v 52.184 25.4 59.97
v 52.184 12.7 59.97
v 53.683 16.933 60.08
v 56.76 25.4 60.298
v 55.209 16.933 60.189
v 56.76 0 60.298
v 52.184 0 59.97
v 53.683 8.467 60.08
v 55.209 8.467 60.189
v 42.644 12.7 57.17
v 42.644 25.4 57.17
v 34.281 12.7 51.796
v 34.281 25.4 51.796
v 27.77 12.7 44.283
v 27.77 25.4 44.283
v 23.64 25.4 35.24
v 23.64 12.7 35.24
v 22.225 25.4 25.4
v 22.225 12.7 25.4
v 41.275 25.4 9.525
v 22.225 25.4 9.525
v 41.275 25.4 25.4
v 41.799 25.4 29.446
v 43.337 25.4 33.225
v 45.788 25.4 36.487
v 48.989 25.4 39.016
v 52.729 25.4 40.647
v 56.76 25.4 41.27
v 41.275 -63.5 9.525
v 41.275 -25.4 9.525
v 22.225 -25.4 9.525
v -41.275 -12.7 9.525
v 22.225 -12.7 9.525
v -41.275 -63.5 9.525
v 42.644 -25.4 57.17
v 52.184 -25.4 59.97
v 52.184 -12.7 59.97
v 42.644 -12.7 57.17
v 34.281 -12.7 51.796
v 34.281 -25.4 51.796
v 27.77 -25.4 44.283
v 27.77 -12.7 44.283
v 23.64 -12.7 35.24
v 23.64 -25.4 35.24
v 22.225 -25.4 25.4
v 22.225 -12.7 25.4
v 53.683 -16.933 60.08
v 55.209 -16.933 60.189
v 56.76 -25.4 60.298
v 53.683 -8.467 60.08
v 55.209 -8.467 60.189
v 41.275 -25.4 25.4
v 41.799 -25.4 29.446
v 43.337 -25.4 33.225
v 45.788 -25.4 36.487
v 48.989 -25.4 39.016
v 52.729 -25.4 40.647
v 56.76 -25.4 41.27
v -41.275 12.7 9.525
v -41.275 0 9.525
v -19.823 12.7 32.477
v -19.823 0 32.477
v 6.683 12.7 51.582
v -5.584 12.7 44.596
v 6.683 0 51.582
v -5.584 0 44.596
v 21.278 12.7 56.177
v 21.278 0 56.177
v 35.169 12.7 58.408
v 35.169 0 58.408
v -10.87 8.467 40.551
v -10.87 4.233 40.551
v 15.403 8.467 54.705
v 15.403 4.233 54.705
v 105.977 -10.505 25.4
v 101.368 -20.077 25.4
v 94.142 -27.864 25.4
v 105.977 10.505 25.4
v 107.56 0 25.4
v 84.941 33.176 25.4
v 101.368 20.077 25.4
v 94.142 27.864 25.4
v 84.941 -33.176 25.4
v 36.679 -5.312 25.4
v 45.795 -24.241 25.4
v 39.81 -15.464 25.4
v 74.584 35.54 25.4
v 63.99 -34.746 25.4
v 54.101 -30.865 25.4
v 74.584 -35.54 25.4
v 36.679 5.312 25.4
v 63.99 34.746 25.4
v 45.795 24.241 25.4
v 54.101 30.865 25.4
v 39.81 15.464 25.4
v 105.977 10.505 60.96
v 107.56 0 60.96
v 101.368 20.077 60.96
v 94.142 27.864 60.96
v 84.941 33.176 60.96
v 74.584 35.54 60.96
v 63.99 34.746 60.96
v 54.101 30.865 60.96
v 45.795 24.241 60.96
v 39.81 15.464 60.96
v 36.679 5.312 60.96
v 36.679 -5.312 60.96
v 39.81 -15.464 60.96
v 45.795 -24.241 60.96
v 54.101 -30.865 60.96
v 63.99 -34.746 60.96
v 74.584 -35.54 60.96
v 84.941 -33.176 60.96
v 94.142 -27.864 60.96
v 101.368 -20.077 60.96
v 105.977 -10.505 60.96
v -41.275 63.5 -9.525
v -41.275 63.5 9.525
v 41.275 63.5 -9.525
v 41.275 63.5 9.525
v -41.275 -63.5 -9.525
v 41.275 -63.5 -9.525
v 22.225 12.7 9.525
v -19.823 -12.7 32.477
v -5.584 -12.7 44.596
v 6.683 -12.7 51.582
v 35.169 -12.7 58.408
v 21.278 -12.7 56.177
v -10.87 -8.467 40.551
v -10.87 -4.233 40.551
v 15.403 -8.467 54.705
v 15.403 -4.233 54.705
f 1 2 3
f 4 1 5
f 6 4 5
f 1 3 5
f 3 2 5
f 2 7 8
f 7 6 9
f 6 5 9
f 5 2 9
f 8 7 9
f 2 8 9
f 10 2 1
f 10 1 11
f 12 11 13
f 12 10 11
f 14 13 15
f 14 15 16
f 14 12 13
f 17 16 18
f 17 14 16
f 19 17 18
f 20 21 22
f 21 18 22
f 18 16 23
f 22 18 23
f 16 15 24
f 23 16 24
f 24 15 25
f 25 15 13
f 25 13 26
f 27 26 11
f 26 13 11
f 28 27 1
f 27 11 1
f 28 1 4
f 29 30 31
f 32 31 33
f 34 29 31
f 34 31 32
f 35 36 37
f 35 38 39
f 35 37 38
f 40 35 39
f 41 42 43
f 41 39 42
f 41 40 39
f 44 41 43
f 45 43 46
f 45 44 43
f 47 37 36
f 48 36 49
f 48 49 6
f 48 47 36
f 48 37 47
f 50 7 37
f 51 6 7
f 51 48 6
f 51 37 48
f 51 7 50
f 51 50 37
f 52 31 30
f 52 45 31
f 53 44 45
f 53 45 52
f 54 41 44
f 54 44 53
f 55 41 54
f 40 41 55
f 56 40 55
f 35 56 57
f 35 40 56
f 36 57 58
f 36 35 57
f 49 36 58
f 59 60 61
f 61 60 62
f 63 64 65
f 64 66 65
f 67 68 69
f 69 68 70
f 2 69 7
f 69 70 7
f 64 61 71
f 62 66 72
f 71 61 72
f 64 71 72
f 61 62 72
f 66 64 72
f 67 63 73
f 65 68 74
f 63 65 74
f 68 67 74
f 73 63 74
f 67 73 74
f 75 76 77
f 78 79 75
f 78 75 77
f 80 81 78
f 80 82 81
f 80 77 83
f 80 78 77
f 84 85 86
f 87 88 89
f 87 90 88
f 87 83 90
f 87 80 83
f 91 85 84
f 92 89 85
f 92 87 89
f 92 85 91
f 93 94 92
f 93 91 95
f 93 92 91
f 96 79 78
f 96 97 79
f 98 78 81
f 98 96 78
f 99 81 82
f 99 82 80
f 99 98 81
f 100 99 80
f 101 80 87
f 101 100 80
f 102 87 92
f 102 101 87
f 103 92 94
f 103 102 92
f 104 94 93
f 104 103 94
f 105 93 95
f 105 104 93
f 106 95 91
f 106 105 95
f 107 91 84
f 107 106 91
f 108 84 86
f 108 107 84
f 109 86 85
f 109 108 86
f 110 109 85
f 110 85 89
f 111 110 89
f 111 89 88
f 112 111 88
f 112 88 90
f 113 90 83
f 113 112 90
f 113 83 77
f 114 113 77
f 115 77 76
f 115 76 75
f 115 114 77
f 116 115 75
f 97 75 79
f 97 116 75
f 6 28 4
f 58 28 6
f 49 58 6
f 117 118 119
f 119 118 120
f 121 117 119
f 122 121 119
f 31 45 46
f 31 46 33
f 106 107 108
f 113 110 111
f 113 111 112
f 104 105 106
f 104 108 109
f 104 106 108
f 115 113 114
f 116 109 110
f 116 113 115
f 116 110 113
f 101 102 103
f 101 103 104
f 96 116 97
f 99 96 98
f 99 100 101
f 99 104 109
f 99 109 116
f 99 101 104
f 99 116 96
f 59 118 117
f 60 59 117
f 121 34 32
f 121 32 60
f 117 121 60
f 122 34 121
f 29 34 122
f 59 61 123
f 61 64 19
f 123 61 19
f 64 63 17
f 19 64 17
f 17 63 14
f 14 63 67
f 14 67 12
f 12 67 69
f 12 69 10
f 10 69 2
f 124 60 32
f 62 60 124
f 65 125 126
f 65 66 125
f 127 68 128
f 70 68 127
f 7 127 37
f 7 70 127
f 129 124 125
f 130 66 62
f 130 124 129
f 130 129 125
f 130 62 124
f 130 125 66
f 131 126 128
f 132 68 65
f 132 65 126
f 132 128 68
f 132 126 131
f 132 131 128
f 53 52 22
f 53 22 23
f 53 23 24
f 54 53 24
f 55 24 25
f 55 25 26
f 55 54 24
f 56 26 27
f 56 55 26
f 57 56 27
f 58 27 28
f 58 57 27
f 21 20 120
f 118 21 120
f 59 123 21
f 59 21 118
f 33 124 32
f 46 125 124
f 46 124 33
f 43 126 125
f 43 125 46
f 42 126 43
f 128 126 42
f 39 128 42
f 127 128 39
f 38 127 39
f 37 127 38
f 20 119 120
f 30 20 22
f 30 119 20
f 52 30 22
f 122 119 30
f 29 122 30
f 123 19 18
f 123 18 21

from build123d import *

# Parameters (mm, degrees)
F1_DEPTH = 63.5
F2_DEPTH = 25.4
F3_DEPTH = 12.7


with BuildPart() as f1:
    # F0 (on Front) → F1 (new body, symmetric)
    with BuildSketch(Plane.XZ):
        Polygon((41.275, -9.525), (41.275, 9.525), (22.225, 9.525), (-41.275, 9.525), (-41.275, -9.525), align=None)
    extrude(amount=F1_DEPTH, both=True)

    # F0 (on Front) → F2 (join, symmetric)
    with BuildSketch(Plane.XZ):
        with BuildLine():
            Line((22.225, 9.525), (41.275, 9.525))
            Line((41.275, 9.525), (41.275, 25.4))
            ThreePointArc((41.275, 25.4), (45.787793, 36.486744), (56.760465, 41.27022))
            Line((56.760465, 41.27022), (56.760465, 60.298004))
            add(Edge.make_bspline(
                [(52.183549, 59.970074), (53.670589, 60.080373), (55.195529, 60.189302), (56.760465, 60.298004)],
                knots=[107.086185, 107.086185, 107.086185, 107.086185, 110.480512, 110.480512, 110.480512, 110.480512], degree=3))
            ThreePointArc((52.183549, 59.970074), (30.756735, 48.272498), (22.225, 25.4))
            Line((22.225, 25.4), (22.225, 9.525))
        make_face()
    extrude(amount=F2_DEPTH, both=True)

    # F0 (on Front) → F3 (join, symmetric)
    with BuildSketch(Plane.XZ):
        with BuildLine():
            Line((-41.275, 9.525), (22.225, 9.525))
            Line((22.225, 9.525), (22.225, 25.4))
            ThreePointArc((22.225, 25.4), (30.756735, 48.272498), (52.183549, 59.970074))
            add(Edge.make_bspline(
                [(-41.275, 9.525), (-3.923113, 51.646193), (5.269544, 56.49028), (52.183549, 59.970074)],
                knots=[0, 0, 0, 0, 107.086185, 107.086185, 107.086185, 107.086185], degree=3))
        make_face()
    extrude(amount=F3_DEPTH, both=True)


with BuildPart() as f4:
    # F0 (on Front) → F4 (revolve)
    with BuildSketch(Plane.XZ):
        Polygon((71.92071, 41.275), (71.92071, 25.4), (107.560465, 25.4), (107.560465, 60.96), (71.92071, 60.96), (71.92071, 60.325), align=None)
    revolve(axis=Axis((71.92071, 0, 43.18), (0, 0, 1)))


solid = Compound([f1.part, f4.part])
